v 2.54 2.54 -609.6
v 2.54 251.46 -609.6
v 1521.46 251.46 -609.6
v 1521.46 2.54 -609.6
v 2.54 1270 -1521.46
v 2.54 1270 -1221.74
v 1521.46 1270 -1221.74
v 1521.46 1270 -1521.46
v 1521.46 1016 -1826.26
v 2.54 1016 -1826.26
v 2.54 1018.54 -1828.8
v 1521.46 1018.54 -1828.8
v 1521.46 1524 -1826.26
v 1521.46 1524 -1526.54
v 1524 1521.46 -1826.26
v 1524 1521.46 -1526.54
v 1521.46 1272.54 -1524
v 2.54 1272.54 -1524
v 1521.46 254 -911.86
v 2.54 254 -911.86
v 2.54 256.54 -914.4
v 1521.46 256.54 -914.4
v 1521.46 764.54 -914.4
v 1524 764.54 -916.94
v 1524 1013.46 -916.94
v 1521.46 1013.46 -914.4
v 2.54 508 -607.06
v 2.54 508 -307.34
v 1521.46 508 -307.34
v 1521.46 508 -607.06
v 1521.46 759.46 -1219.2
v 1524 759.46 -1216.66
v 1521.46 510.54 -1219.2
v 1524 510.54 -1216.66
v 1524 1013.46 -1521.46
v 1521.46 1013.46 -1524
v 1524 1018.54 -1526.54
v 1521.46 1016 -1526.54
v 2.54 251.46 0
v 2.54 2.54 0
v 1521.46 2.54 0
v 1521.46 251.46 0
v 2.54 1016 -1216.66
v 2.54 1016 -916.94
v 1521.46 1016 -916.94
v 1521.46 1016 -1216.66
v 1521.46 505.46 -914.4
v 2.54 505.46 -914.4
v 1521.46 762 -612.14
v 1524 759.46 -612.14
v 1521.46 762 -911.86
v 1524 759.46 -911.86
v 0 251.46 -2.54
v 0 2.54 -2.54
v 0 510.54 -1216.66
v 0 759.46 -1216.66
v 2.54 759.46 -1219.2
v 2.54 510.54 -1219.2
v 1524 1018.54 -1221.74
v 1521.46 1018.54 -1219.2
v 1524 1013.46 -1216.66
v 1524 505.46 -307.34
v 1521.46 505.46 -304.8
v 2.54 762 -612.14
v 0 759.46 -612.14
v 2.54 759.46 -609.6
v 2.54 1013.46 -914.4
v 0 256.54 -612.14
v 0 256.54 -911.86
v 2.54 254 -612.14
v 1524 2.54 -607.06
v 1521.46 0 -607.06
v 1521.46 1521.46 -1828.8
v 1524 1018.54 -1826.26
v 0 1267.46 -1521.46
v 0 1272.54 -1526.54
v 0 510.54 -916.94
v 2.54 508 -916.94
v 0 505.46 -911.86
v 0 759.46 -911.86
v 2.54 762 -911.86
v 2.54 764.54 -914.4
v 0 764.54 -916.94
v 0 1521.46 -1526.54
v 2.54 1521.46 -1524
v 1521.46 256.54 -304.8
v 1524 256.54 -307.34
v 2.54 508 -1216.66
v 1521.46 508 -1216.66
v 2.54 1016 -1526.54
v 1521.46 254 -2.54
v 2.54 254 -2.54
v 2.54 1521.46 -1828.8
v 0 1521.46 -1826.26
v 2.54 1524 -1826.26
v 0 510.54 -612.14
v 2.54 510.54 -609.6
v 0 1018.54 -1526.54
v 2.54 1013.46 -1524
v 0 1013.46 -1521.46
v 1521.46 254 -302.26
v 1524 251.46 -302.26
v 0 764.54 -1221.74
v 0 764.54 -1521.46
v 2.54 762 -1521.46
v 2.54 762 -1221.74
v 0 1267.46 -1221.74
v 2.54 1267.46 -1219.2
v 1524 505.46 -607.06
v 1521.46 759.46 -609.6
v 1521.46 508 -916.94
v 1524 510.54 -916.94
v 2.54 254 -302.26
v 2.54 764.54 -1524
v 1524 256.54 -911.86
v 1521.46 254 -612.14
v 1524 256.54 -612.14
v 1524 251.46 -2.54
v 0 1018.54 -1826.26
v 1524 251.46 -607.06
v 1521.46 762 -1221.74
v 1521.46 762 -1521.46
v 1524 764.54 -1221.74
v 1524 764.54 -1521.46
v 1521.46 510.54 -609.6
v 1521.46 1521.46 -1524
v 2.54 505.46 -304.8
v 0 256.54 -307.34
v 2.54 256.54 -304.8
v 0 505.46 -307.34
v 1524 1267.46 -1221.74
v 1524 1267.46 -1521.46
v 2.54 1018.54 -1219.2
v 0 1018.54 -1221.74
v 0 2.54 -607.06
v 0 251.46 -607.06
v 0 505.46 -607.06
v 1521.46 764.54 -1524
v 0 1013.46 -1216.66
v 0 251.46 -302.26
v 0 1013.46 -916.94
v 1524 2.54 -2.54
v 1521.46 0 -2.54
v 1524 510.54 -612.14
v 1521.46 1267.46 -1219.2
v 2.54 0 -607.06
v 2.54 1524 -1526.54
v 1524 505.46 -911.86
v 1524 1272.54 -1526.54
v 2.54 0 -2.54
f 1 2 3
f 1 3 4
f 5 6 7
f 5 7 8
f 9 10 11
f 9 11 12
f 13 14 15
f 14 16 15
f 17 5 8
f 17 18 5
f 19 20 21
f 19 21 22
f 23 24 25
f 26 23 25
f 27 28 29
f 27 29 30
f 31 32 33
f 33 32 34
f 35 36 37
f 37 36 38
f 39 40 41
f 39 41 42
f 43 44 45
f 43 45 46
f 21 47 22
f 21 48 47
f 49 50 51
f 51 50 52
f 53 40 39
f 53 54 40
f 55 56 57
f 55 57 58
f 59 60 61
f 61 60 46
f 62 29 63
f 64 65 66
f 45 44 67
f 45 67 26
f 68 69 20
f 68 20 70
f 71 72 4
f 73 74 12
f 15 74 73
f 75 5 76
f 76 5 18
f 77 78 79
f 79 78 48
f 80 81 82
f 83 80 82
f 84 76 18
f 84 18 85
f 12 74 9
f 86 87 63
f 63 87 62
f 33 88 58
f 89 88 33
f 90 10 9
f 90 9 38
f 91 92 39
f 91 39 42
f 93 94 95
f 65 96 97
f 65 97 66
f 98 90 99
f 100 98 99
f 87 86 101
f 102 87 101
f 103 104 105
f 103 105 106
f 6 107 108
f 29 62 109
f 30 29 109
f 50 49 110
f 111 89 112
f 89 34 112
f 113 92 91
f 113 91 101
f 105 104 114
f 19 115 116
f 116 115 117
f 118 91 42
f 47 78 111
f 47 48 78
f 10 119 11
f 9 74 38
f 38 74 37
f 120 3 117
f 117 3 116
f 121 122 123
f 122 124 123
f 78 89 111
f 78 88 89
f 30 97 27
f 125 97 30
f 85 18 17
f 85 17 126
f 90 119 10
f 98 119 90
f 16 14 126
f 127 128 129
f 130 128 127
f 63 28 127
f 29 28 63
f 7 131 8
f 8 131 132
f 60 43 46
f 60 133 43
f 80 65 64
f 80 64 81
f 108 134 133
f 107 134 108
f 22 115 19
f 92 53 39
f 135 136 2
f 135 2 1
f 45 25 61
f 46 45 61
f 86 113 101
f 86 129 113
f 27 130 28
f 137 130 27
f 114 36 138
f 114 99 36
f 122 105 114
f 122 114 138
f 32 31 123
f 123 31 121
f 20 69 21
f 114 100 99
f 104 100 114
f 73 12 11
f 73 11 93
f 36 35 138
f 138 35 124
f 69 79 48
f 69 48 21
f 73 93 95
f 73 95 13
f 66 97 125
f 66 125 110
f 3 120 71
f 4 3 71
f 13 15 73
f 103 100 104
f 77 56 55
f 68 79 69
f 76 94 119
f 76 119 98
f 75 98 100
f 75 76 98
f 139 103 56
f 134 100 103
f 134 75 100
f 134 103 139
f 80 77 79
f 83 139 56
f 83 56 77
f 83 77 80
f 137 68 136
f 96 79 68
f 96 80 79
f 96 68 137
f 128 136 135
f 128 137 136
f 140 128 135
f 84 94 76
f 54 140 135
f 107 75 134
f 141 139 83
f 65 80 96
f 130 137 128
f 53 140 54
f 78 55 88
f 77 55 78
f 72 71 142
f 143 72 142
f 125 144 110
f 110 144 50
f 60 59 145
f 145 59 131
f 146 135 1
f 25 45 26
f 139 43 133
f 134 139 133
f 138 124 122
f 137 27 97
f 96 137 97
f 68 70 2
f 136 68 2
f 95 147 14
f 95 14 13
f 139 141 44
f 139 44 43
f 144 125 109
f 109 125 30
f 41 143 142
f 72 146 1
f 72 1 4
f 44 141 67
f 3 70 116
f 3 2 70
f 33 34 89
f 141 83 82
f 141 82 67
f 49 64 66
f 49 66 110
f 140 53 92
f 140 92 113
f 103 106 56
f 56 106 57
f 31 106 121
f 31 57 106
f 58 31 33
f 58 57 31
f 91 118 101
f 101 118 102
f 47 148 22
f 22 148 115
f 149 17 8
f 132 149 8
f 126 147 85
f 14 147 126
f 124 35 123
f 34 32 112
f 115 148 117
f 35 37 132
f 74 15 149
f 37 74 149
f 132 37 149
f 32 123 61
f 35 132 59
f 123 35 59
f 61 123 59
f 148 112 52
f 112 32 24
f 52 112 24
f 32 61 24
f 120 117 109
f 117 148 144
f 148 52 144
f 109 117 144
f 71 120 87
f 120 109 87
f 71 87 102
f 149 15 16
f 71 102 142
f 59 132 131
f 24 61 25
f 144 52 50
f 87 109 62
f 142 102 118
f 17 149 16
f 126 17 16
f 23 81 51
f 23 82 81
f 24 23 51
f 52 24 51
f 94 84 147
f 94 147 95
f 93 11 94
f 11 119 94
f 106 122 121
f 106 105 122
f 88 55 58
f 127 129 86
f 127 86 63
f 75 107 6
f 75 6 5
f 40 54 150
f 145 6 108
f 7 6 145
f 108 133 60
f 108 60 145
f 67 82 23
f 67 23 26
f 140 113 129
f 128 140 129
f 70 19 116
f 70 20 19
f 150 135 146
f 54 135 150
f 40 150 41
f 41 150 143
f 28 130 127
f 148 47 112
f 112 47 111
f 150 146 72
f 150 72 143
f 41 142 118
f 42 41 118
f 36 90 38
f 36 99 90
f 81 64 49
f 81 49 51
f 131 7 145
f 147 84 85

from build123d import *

# Parameters (mm, degrees)
BOSS_EXTRUDE2_DEPTH = 1524
CHAMFER1_SIZE       = 2.54


with BuildPart() as part:
    # Sketch3 → Boss-Extrude2 (new body)
    with BuildSketch(Plane(origin=(0, 0, 0), x_dir=(0, 0, -1), z_dir=(1, 0, 0))):
        Polygon((0, 0), (0, 254), (304.8, 254), (304.8, 508), (609.6, 508), (609.6, 762), (914.4, 762), (914.4, 1016), (1219.2, 1016), (1219.2, 1270), (1524, 1270), (1524, 1524), (1828.8, 1524), (1828.8, 1270), (1828.8, 1016), (1524, 1016), (1524, 762), (1219.2, 762), (1219.2, 508), (914.4, 508), (914.4, 254), (609.6, 254), (609.6, 0), align=None)
    extrude(amount=BOSS_EXTRUDE2_DEPTH)

    # Chamfer1
    chamfer1_edges = [part.edges().sort_by_distance(p)[0] for p in [
        (1524, 254, -762),
        (1524, 381, -914.4),
        (1524, 508, -1066.8),
        (1524, 635, -1219.2),
        (0, 127, 0),
        (0, 254, -152.4),
        (0, 381, -304.8),
        (0, 508, -457.2),
        (0, 635, -609.6),
        (0, 762, -762),
        (1524, 762, -1371.6),
        (0, 889, -914.4),
        (0, 1016, -1066.8),
        (0, 1143, -1219.2),
        (0, 1270, -1371.6),
        (0, 1397, -1524),
        (0, 1524, -1676.4),
        (0, 1270, -1828.8),
        (1524, 889, -1524),
        (0, 1016, -1676.4),
        (0, 889, -1524),
        (0, 762, -1371.6),
        (0, 635, -1219.2),
        (0, 508, -1066.8),
        (0, 381, -914.4),
        (0, 254, -762),
        (1524, 1016, -1676.4),
        (0, 127, -609.6),
        (0, 0, -304.8),
        (1524, 1270, -1828.8),
        (762, 0, 0),
        (762, 254, 0),
        (762, 254, -304.8),
        (762, 508, -304.8),
        (762, 508, -609.6),
        (762, 762, -609.6),
        (762, 762, -914.4),
        (762, 1016, -914.4),
        (762, 1016, -1219.2),
        (762, 1270, -1219.2),
        (762, 1270, -1524),
        (1524, 1524, -1676.4),
        (762, 1524, -1524),
        (762, 1524, -1828.8),
        (762, 1016, -1828.8),
        (762, 1016, -1524),
        (762, 762, -1524),
        (762, 762, -1219.2),
        (762, 508, -1219.2),
        (762, 508, -914.4),
        (762, 254, -914.4),
        (762, 254, -609.6),
        (762, 0, -609.6),
        (1524, 0, -304.8),
        (1524, 1397, -1524),
        (1524, 1270, -1371.6),
        (1524, 1143, -1219.2),
        (1524, 1016, -1066.8),
        (1524, 889, -914.4),
        (1524, 762, -762),
        (1524, 635, -609.6),
        (1524, 508, -457.2),
        (1524, 381, -304.8),
        (1524, 254, -152.4),
        (1524, 127, -609.6),
        (1524, 127, 0),
    ]]
    chamfer(chamfer1_edges, length=CHAMFER1_SIZE)


solid = part.part
